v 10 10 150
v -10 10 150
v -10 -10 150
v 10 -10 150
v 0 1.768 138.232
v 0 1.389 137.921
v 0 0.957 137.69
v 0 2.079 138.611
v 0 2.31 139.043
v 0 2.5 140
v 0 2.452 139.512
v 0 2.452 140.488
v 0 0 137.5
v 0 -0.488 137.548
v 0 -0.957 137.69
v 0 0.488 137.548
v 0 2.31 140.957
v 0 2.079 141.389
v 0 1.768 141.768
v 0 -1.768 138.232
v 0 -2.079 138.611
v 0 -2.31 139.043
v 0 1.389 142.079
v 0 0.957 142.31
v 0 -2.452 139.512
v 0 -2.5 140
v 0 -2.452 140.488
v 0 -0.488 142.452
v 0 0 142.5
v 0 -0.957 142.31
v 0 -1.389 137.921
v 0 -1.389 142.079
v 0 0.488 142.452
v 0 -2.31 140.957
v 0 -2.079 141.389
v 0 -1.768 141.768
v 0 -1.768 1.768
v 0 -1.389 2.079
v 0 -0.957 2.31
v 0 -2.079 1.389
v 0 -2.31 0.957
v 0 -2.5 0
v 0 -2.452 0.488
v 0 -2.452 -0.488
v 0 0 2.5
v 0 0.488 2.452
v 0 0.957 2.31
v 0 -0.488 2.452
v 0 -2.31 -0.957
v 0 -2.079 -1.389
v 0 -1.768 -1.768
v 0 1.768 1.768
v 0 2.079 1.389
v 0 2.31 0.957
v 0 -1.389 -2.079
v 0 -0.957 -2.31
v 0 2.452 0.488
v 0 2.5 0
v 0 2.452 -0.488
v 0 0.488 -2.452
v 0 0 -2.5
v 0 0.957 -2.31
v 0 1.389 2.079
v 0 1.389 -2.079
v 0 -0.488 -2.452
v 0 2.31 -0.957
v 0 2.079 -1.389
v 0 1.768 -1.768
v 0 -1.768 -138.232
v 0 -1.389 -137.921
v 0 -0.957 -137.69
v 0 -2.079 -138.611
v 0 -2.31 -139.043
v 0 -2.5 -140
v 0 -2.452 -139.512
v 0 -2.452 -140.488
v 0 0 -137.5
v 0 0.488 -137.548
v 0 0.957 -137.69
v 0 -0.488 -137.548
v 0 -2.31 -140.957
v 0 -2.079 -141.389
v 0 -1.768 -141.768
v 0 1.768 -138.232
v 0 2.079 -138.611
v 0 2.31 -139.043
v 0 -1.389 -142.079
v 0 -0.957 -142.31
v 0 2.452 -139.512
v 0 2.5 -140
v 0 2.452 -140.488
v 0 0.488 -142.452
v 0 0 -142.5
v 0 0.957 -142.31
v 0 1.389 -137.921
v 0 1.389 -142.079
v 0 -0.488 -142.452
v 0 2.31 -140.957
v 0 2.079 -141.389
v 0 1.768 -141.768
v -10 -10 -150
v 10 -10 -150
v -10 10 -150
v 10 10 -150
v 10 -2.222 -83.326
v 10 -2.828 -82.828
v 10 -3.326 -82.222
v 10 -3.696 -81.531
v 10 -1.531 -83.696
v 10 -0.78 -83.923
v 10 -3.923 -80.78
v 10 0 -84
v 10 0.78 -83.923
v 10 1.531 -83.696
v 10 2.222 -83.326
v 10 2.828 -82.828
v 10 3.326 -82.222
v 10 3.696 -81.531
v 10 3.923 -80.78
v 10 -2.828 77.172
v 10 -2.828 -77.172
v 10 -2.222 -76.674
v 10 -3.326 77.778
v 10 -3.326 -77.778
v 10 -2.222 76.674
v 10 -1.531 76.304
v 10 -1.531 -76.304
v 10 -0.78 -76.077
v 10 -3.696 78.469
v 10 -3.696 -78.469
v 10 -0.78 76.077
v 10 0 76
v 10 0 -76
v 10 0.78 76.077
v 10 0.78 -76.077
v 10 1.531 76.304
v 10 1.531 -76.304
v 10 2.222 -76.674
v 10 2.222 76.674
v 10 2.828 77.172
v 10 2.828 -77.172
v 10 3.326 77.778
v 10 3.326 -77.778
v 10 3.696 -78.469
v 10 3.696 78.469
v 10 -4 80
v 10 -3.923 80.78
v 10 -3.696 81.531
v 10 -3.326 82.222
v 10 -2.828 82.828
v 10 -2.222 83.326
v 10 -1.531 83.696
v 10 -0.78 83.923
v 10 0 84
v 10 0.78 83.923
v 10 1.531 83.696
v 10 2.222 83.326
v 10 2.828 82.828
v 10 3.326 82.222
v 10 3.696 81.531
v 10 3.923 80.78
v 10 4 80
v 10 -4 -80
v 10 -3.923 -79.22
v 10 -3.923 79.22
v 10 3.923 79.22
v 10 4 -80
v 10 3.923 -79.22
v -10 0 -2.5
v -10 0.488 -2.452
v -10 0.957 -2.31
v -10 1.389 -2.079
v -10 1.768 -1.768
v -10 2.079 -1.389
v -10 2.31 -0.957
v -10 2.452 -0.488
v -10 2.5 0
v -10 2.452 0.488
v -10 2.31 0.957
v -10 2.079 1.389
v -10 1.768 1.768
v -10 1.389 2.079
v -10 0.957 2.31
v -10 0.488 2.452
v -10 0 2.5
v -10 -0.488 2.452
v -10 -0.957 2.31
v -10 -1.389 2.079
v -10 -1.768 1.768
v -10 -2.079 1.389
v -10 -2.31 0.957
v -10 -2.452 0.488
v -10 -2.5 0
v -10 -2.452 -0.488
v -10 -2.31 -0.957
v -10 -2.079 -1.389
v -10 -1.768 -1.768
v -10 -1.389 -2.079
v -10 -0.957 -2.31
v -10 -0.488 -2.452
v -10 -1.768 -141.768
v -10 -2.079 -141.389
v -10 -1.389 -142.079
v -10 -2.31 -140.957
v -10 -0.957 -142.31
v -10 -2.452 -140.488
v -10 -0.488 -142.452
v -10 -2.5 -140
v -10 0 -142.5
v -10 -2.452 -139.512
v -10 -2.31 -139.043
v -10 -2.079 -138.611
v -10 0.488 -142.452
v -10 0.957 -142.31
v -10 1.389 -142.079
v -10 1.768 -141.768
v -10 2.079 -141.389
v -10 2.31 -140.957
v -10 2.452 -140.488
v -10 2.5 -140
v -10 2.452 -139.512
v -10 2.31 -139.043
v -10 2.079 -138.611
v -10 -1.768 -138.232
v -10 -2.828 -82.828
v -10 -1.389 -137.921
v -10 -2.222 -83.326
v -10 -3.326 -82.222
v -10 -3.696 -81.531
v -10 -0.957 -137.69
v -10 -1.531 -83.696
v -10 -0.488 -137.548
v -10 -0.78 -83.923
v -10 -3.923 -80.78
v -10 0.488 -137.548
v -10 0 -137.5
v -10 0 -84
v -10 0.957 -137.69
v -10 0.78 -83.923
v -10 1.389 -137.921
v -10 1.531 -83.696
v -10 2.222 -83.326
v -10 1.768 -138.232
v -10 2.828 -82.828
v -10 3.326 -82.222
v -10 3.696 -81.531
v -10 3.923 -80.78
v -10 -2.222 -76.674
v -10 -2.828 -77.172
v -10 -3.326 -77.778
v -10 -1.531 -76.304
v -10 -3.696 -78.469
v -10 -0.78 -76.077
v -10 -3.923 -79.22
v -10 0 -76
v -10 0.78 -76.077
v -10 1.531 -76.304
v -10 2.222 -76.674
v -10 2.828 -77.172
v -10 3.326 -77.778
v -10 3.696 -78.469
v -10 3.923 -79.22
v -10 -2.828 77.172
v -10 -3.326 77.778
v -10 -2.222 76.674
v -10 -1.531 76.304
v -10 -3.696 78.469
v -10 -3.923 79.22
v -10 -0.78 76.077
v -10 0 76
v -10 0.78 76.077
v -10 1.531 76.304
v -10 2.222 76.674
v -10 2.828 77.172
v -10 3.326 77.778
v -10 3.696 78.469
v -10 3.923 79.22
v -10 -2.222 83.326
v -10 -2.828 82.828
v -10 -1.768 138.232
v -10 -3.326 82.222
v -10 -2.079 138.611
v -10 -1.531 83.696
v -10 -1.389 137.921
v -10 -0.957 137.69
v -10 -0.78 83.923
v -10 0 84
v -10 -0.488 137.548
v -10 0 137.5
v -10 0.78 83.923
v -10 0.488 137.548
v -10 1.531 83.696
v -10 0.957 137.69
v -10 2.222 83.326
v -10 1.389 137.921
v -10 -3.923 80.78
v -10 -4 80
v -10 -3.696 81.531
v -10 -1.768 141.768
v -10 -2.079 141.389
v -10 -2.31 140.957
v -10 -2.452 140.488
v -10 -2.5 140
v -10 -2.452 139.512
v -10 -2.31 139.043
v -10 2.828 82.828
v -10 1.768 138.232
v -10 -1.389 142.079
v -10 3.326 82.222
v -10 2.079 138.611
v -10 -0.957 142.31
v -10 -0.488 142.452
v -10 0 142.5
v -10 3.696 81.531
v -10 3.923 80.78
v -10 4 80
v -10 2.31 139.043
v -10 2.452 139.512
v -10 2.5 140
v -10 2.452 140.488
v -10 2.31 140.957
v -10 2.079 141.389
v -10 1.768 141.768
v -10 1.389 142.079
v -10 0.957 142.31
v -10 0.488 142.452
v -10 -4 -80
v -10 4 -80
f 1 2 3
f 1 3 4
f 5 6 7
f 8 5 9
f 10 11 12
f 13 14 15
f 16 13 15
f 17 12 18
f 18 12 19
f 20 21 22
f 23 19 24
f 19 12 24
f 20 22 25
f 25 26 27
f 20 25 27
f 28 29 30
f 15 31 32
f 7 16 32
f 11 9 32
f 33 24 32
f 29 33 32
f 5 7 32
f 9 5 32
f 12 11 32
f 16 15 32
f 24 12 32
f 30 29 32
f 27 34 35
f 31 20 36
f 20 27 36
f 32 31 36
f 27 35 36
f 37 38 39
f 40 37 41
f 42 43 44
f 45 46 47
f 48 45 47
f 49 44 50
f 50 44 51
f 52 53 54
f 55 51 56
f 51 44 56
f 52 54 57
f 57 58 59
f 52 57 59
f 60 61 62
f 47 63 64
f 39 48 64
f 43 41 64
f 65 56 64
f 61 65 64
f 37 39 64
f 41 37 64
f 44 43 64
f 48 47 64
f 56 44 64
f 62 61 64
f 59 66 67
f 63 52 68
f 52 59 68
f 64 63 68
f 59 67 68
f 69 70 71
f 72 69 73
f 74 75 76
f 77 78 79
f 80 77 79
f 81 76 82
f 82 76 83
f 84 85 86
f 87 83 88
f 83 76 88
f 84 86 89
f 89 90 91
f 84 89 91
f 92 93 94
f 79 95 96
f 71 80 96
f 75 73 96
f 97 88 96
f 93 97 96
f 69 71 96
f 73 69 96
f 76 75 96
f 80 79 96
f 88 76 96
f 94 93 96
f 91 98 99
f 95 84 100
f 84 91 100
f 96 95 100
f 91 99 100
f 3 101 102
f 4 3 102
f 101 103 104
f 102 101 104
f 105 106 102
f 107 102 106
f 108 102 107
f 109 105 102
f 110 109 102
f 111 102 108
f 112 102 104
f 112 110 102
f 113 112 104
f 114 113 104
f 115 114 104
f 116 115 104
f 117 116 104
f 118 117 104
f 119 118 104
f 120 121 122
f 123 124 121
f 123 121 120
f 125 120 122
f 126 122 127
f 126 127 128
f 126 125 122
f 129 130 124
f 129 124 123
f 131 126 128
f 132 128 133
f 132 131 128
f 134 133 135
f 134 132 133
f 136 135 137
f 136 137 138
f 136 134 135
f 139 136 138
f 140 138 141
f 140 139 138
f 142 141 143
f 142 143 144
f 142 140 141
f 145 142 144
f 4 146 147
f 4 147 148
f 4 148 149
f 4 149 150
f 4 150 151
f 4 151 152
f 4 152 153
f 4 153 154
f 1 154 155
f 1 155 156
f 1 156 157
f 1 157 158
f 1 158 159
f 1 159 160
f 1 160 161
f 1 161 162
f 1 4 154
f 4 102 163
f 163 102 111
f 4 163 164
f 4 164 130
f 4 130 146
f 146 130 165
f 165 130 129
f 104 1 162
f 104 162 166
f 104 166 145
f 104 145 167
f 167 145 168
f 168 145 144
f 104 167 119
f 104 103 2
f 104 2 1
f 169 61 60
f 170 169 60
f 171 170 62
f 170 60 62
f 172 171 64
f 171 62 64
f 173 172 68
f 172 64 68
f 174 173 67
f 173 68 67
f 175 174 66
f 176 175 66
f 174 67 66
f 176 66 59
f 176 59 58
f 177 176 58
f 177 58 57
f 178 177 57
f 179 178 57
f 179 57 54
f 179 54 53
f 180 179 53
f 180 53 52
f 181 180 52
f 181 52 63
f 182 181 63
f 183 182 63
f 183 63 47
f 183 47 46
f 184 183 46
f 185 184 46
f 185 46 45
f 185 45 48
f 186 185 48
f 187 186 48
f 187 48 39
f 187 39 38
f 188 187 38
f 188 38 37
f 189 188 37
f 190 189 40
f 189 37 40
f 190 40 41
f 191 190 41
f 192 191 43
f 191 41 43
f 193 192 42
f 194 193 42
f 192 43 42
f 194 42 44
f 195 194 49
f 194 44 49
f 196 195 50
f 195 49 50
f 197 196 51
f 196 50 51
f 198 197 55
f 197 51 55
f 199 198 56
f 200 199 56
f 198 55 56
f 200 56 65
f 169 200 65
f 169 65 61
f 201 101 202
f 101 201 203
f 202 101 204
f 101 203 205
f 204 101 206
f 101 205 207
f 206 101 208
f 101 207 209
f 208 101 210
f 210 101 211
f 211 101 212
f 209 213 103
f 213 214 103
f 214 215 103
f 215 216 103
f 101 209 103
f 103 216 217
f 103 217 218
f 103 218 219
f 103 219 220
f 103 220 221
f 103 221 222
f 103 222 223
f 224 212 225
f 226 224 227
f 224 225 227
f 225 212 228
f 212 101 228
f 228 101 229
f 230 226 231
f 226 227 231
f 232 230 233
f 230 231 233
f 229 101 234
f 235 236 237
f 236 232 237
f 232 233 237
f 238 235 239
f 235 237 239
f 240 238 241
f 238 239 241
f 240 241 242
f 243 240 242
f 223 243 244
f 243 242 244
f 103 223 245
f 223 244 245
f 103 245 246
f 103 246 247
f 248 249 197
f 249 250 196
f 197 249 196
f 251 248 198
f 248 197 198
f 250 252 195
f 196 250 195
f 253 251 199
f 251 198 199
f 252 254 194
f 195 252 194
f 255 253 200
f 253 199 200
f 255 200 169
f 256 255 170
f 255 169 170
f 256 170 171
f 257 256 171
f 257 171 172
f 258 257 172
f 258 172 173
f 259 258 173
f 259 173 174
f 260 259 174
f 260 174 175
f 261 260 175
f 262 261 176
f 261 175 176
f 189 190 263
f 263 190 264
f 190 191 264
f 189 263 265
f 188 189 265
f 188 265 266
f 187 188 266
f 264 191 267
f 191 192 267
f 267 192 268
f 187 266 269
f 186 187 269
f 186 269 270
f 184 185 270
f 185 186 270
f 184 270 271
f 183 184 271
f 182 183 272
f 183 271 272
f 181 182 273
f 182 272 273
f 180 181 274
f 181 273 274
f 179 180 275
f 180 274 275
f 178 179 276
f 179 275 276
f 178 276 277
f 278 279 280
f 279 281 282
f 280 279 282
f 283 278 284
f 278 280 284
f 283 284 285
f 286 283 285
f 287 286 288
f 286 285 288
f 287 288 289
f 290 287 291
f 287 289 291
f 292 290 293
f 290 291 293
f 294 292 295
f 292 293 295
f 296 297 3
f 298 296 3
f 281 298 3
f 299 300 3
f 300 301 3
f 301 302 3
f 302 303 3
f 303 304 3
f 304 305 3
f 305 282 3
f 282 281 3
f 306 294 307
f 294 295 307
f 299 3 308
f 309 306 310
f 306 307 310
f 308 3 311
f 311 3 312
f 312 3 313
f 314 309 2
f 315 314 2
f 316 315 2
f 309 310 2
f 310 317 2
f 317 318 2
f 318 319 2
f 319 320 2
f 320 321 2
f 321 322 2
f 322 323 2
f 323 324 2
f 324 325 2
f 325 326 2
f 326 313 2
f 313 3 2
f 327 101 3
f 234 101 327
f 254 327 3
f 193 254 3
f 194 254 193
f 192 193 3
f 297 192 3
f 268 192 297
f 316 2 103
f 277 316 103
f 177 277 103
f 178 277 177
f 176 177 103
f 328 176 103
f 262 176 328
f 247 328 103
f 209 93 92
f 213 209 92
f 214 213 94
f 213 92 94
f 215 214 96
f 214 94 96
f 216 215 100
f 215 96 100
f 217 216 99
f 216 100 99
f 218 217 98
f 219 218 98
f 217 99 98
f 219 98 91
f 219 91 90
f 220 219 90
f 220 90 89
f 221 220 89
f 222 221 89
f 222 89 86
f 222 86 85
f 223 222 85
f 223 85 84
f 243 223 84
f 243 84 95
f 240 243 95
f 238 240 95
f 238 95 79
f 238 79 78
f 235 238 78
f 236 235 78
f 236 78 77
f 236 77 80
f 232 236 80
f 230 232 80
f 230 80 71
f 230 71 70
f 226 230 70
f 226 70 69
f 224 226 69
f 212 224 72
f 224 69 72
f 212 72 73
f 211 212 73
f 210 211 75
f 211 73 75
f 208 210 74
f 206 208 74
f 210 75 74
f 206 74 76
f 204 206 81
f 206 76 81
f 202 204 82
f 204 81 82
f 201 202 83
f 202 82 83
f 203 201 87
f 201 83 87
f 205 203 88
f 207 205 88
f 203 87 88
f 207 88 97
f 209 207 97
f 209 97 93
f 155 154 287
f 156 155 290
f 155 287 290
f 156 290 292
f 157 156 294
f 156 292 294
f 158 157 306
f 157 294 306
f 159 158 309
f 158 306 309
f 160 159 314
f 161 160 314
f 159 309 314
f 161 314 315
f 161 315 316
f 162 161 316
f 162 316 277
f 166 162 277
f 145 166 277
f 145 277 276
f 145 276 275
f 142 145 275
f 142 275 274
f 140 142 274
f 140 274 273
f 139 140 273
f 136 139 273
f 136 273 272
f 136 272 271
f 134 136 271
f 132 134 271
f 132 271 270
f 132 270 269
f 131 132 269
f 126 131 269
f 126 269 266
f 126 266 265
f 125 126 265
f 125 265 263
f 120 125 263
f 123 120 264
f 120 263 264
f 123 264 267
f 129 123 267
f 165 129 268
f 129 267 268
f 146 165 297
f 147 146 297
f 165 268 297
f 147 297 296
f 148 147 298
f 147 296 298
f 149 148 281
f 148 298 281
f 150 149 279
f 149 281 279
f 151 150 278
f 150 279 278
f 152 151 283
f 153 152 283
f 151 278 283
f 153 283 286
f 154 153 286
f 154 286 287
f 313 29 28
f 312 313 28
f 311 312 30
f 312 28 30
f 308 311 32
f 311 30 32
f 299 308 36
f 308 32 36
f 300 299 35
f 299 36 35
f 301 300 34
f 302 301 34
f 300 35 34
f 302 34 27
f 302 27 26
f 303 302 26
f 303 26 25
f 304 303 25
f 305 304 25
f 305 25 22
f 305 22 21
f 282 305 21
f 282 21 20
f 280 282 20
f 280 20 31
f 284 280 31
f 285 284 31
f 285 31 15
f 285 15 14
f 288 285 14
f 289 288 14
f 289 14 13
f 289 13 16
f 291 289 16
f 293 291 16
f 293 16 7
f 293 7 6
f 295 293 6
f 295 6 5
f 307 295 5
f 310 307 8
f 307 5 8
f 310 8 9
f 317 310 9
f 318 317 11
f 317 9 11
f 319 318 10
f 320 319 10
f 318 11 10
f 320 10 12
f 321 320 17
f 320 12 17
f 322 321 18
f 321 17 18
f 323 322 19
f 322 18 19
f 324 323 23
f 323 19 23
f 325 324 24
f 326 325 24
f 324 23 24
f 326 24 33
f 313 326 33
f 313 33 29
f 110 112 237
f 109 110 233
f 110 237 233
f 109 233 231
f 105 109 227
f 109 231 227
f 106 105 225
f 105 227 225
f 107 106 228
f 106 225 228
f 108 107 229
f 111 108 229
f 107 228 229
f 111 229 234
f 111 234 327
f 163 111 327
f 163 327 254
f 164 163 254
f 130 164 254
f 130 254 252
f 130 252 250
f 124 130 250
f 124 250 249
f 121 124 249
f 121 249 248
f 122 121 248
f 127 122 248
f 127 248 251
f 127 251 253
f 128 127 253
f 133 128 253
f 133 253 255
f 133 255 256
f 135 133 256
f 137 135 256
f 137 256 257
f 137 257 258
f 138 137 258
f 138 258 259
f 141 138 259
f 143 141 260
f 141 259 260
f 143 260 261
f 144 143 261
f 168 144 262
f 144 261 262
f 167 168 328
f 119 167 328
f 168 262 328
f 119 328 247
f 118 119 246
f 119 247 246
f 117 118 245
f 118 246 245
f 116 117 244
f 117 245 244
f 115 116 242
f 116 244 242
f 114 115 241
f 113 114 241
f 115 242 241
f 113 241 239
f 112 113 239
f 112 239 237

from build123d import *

# Parameters (mm, degrees)
CROQUIS1_W              = 20
CROQUIS1_H              = 20
SALIENTE_EXTRUIR1_DEPTH = 150
CROQUIS2_R              = 2.5
CORTAR_EXTRUIR1_DEPTH   = 151.665191733
CROQUIS3_R              = 4
CORTAR_EXTRUIR2_DEPTH   = 152.657508881


with BuildPart() as part:
    # Croquis1 → Saliente-Extruir1 (new, symmetric)
    with BuildSketch(Plane.XY):
        Rectangle(CROQUIS1_W, CROQUIS1_H)
    extrude(amount=SALIENTE_EXTRUIR1_DEPTH, both=True)

    # Croquis2 → Cortar-Extruir1 (cut, through all)
    with BuildSketch(Plane(origin=(0, 0, 0), x_dir=(0, 0, -1), z_dir=(1, 0, 0))):
        Circle(CROQUIS2_R)
        with Locations((140, 0)):
            Circle(CROQUIS2_R)
        with Locations(Location((-140, 0, 0), (0, 0, 180))):
            Circle(CROQUIS2_R)
    extrude(amount=-CORTAR_EXTRUIR1_DEPTH, mode=Mode.SUBTRACT)

    # Croquis3 → Cortar-Extruir2 (cut, through all)
    with BuildSketch(Plane.ZY.offset(10)):
        with Locations((80, 0)):
            Circle(CROQUIS3_R)
        with Locations(Location((-80, 0, 0), (0, 0, 180))):
            Circle(CROQUIS3_R)
    extrude(amount=-CORTAR_EXTRUIR2_DEPTH, mode=Mode.SUBTRACT)


solid = part.part
